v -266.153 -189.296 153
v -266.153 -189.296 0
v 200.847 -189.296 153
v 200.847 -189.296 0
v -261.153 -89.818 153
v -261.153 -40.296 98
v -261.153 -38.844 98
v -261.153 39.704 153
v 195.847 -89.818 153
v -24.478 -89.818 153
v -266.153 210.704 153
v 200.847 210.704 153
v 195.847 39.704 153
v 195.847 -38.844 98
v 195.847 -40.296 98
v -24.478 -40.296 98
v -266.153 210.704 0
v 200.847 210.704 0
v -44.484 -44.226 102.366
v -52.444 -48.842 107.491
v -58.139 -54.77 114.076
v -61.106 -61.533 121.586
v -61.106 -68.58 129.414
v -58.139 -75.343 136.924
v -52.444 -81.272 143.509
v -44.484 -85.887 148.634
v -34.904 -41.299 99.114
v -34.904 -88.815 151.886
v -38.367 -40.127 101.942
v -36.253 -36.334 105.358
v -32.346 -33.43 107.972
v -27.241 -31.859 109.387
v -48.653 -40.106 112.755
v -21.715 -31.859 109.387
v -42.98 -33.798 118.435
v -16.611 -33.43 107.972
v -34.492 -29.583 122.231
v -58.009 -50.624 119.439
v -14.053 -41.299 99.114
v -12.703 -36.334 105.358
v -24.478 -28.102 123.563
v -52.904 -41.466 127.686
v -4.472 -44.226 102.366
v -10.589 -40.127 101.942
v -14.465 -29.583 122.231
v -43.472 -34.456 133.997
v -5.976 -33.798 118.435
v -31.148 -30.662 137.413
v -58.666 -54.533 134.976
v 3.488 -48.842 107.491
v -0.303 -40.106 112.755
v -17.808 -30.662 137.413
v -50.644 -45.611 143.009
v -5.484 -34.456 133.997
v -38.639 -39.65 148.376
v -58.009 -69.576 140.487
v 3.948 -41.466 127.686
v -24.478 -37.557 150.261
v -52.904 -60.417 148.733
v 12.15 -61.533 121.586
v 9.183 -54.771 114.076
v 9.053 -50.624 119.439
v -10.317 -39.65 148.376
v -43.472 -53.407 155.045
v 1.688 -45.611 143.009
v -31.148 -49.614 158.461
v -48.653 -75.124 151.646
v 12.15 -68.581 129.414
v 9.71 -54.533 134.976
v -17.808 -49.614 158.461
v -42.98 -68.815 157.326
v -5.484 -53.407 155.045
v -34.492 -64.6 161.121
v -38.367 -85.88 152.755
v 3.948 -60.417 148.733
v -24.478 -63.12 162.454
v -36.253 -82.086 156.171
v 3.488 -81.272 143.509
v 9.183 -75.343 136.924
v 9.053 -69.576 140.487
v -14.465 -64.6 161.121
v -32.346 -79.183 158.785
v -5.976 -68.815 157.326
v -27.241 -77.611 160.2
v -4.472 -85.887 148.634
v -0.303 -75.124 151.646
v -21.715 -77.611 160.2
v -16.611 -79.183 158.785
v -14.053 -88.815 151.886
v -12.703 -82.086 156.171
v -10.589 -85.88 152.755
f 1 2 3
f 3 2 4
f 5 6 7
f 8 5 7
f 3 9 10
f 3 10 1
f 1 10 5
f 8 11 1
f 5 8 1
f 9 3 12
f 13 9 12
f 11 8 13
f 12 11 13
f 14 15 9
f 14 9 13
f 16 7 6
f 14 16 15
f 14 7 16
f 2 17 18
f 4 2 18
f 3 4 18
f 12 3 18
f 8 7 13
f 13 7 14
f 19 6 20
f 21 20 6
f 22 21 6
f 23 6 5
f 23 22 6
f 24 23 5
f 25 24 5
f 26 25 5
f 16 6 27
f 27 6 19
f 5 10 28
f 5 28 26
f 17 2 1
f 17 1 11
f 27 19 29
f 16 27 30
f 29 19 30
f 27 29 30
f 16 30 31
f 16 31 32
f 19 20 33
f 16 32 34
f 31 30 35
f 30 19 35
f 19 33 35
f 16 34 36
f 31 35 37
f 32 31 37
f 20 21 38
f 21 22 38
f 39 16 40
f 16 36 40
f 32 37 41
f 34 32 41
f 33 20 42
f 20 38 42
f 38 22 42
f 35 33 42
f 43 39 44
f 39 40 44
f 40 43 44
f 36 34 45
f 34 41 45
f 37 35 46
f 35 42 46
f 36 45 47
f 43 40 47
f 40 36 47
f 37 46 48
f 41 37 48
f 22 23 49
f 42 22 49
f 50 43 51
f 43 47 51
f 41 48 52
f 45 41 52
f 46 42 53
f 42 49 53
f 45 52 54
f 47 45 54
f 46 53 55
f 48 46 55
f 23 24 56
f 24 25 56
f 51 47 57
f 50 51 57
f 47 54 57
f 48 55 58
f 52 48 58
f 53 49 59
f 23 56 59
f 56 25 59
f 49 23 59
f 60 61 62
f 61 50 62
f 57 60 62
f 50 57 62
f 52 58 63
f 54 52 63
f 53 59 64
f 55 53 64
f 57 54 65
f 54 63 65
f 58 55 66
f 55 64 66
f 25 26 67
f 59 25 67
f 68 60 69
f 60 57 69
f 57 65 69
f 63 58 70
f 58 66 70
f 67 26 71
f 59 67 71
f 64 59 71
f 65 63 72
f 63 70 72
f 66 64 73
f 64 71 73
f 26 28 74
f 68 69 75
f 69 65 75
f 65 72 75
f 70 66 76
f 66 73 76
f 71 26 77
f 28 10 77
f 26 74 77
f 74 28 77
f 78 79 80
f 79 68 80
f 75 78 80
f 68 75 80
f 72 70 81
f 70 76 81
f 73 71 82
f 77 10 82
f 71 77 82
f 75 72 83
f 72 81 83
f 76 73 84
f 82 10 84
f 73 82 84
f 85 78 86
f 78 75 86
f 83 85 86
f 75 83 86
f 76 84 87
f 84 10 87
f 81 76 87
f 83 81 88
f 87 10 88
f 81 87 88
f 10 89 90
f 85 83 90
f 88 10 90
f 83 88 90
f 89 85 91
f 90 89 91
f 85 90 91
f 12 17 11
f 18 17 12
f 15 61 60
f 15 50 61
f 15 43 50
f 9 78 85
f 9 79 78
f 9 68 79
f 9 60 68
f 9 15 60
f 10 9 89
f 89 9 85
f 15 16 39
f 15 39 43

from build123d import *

# Parameters (mm, degrees)
ESQUISSE1_W             = 467
ESQUISSE1_H             = 400
BOSS_EXTRU_1_DEPTH      = 153
ESQUISSE2_W             = 457
ESQUISSE2_H             = 130
ENL_V_MAT_EXTRU_1_DEPTH = 55
CHANFREIN2_SIZE2        = 78.548140371
CHANFREIN2_SIZE         = 55
CHANFREIN3_SIZE         = 50
CHANFREIN3_SIZE_2       = 55.530625741
R_VOLUTION1_ANGLE       = 182


# Some blends are built 0.0001 mm under size
with BuildPart() as part:
    # Esquisse1 → Boss.-Extru.1 (new body)
    with BuildSketch(Plane.XY):
        with Locations((-32.653034301, 10.704485488)):
            Rectangle(ESQUISSE1_W, ESQUISSE1_H)
    extrude(amount=BOSS_EXTRU_1_DEPTH)

    # Esquisse2 → Enlèv. mat.-Extru.1 (cut)
    with BuildSketch(Plane.XY.offset(153)):
        with Locations((-32.653034301, -25.295514512)):
            Rectangle(ESQUISSE2_W, ESQUISSE2_H)
    extrude(amount=-ENL_V_MAT_EXTRU_1_DEPTH, mode=Mode.SUBTRACT)

    # Chanfrein2
    chanfrein2_edges = [part.edges().sort_by_distance(p)[0] for p in [
        (-32.653034301, 39.704485488, 98),
    ]]
    chanfrein2_side = [part.faces().sort_by_distance(p)[0] for p in [
        (-32.653034301, 39.704485488, 99.1),
    ]]
    chamfer(chanfrein2_edges, length=CHANFREIN2_SIZE - 0.0001, length2=CHANFREIN2_SIZE2 - 0.0001, reference=chanfrein2_side[0])  # a hair under: the kernel refuses the full size

    # Chanfrein3
    # the kernel refuses this chamfer: 55.530625741, 50 mm, written as the material it adds along each edge
    with BuildSketch(Plane(origin=(195.846965699, -90.295514512, 98), x_dir=(0, 0.9994864482690293, -0.03204434000819546), z_dir=(-1, 0, 0))) as chanfrein3_piece_1_section:
        Polygon((CHANFREIN3_SIZE * 0.999486448269, -CHANFREIN3_SIZE * 0.0320443400082), (-CHANFREIN3_SIZE_2 * 0.0320443400085, -CHANFREIN3_SIZE_2 * 0.999486448277), (0, 0), align=None)
    chanfrein3_piece_1 = extrude(amount=457, mode=Mode.PRIVATE)
    chanfrein3_piece_1 = split(chanfrein3_piece_1, bisect_by=Plane(origin=(-32.653034301, -73.821041767, 153), z_dir=(0, 0, -1)), keep=Keep.TOP, mode=Mode.PRIVATE)
    add(chanfrein3_piece_1)

    # Esquisse3 → Révolution1 (revolve)
    with BuildSketch(Plane(origin=(0, 26.477801513, 23.840719566), x_dir=(1, 0, 0), z_dir=(0, 0.7431448254773976, 0.6691306063588547))):
        with BuildLine():
            Line((-24.478047151, -173.800955084), (-24.478047151, -99.791154956))
            ThreePointArc((-24.478047151, -99.791154956), (-61.482947215, -136.79605502), (-24.478047151, -173.800955084))
        make_face()
    revolve(axis=Axis((-24.478047151, -89.817736948, 153), (0, 0.6691306063588548, -0.7431448254773975)), revolution_arc=R_VOLUTION1_ANGLE)


solid = part.part
